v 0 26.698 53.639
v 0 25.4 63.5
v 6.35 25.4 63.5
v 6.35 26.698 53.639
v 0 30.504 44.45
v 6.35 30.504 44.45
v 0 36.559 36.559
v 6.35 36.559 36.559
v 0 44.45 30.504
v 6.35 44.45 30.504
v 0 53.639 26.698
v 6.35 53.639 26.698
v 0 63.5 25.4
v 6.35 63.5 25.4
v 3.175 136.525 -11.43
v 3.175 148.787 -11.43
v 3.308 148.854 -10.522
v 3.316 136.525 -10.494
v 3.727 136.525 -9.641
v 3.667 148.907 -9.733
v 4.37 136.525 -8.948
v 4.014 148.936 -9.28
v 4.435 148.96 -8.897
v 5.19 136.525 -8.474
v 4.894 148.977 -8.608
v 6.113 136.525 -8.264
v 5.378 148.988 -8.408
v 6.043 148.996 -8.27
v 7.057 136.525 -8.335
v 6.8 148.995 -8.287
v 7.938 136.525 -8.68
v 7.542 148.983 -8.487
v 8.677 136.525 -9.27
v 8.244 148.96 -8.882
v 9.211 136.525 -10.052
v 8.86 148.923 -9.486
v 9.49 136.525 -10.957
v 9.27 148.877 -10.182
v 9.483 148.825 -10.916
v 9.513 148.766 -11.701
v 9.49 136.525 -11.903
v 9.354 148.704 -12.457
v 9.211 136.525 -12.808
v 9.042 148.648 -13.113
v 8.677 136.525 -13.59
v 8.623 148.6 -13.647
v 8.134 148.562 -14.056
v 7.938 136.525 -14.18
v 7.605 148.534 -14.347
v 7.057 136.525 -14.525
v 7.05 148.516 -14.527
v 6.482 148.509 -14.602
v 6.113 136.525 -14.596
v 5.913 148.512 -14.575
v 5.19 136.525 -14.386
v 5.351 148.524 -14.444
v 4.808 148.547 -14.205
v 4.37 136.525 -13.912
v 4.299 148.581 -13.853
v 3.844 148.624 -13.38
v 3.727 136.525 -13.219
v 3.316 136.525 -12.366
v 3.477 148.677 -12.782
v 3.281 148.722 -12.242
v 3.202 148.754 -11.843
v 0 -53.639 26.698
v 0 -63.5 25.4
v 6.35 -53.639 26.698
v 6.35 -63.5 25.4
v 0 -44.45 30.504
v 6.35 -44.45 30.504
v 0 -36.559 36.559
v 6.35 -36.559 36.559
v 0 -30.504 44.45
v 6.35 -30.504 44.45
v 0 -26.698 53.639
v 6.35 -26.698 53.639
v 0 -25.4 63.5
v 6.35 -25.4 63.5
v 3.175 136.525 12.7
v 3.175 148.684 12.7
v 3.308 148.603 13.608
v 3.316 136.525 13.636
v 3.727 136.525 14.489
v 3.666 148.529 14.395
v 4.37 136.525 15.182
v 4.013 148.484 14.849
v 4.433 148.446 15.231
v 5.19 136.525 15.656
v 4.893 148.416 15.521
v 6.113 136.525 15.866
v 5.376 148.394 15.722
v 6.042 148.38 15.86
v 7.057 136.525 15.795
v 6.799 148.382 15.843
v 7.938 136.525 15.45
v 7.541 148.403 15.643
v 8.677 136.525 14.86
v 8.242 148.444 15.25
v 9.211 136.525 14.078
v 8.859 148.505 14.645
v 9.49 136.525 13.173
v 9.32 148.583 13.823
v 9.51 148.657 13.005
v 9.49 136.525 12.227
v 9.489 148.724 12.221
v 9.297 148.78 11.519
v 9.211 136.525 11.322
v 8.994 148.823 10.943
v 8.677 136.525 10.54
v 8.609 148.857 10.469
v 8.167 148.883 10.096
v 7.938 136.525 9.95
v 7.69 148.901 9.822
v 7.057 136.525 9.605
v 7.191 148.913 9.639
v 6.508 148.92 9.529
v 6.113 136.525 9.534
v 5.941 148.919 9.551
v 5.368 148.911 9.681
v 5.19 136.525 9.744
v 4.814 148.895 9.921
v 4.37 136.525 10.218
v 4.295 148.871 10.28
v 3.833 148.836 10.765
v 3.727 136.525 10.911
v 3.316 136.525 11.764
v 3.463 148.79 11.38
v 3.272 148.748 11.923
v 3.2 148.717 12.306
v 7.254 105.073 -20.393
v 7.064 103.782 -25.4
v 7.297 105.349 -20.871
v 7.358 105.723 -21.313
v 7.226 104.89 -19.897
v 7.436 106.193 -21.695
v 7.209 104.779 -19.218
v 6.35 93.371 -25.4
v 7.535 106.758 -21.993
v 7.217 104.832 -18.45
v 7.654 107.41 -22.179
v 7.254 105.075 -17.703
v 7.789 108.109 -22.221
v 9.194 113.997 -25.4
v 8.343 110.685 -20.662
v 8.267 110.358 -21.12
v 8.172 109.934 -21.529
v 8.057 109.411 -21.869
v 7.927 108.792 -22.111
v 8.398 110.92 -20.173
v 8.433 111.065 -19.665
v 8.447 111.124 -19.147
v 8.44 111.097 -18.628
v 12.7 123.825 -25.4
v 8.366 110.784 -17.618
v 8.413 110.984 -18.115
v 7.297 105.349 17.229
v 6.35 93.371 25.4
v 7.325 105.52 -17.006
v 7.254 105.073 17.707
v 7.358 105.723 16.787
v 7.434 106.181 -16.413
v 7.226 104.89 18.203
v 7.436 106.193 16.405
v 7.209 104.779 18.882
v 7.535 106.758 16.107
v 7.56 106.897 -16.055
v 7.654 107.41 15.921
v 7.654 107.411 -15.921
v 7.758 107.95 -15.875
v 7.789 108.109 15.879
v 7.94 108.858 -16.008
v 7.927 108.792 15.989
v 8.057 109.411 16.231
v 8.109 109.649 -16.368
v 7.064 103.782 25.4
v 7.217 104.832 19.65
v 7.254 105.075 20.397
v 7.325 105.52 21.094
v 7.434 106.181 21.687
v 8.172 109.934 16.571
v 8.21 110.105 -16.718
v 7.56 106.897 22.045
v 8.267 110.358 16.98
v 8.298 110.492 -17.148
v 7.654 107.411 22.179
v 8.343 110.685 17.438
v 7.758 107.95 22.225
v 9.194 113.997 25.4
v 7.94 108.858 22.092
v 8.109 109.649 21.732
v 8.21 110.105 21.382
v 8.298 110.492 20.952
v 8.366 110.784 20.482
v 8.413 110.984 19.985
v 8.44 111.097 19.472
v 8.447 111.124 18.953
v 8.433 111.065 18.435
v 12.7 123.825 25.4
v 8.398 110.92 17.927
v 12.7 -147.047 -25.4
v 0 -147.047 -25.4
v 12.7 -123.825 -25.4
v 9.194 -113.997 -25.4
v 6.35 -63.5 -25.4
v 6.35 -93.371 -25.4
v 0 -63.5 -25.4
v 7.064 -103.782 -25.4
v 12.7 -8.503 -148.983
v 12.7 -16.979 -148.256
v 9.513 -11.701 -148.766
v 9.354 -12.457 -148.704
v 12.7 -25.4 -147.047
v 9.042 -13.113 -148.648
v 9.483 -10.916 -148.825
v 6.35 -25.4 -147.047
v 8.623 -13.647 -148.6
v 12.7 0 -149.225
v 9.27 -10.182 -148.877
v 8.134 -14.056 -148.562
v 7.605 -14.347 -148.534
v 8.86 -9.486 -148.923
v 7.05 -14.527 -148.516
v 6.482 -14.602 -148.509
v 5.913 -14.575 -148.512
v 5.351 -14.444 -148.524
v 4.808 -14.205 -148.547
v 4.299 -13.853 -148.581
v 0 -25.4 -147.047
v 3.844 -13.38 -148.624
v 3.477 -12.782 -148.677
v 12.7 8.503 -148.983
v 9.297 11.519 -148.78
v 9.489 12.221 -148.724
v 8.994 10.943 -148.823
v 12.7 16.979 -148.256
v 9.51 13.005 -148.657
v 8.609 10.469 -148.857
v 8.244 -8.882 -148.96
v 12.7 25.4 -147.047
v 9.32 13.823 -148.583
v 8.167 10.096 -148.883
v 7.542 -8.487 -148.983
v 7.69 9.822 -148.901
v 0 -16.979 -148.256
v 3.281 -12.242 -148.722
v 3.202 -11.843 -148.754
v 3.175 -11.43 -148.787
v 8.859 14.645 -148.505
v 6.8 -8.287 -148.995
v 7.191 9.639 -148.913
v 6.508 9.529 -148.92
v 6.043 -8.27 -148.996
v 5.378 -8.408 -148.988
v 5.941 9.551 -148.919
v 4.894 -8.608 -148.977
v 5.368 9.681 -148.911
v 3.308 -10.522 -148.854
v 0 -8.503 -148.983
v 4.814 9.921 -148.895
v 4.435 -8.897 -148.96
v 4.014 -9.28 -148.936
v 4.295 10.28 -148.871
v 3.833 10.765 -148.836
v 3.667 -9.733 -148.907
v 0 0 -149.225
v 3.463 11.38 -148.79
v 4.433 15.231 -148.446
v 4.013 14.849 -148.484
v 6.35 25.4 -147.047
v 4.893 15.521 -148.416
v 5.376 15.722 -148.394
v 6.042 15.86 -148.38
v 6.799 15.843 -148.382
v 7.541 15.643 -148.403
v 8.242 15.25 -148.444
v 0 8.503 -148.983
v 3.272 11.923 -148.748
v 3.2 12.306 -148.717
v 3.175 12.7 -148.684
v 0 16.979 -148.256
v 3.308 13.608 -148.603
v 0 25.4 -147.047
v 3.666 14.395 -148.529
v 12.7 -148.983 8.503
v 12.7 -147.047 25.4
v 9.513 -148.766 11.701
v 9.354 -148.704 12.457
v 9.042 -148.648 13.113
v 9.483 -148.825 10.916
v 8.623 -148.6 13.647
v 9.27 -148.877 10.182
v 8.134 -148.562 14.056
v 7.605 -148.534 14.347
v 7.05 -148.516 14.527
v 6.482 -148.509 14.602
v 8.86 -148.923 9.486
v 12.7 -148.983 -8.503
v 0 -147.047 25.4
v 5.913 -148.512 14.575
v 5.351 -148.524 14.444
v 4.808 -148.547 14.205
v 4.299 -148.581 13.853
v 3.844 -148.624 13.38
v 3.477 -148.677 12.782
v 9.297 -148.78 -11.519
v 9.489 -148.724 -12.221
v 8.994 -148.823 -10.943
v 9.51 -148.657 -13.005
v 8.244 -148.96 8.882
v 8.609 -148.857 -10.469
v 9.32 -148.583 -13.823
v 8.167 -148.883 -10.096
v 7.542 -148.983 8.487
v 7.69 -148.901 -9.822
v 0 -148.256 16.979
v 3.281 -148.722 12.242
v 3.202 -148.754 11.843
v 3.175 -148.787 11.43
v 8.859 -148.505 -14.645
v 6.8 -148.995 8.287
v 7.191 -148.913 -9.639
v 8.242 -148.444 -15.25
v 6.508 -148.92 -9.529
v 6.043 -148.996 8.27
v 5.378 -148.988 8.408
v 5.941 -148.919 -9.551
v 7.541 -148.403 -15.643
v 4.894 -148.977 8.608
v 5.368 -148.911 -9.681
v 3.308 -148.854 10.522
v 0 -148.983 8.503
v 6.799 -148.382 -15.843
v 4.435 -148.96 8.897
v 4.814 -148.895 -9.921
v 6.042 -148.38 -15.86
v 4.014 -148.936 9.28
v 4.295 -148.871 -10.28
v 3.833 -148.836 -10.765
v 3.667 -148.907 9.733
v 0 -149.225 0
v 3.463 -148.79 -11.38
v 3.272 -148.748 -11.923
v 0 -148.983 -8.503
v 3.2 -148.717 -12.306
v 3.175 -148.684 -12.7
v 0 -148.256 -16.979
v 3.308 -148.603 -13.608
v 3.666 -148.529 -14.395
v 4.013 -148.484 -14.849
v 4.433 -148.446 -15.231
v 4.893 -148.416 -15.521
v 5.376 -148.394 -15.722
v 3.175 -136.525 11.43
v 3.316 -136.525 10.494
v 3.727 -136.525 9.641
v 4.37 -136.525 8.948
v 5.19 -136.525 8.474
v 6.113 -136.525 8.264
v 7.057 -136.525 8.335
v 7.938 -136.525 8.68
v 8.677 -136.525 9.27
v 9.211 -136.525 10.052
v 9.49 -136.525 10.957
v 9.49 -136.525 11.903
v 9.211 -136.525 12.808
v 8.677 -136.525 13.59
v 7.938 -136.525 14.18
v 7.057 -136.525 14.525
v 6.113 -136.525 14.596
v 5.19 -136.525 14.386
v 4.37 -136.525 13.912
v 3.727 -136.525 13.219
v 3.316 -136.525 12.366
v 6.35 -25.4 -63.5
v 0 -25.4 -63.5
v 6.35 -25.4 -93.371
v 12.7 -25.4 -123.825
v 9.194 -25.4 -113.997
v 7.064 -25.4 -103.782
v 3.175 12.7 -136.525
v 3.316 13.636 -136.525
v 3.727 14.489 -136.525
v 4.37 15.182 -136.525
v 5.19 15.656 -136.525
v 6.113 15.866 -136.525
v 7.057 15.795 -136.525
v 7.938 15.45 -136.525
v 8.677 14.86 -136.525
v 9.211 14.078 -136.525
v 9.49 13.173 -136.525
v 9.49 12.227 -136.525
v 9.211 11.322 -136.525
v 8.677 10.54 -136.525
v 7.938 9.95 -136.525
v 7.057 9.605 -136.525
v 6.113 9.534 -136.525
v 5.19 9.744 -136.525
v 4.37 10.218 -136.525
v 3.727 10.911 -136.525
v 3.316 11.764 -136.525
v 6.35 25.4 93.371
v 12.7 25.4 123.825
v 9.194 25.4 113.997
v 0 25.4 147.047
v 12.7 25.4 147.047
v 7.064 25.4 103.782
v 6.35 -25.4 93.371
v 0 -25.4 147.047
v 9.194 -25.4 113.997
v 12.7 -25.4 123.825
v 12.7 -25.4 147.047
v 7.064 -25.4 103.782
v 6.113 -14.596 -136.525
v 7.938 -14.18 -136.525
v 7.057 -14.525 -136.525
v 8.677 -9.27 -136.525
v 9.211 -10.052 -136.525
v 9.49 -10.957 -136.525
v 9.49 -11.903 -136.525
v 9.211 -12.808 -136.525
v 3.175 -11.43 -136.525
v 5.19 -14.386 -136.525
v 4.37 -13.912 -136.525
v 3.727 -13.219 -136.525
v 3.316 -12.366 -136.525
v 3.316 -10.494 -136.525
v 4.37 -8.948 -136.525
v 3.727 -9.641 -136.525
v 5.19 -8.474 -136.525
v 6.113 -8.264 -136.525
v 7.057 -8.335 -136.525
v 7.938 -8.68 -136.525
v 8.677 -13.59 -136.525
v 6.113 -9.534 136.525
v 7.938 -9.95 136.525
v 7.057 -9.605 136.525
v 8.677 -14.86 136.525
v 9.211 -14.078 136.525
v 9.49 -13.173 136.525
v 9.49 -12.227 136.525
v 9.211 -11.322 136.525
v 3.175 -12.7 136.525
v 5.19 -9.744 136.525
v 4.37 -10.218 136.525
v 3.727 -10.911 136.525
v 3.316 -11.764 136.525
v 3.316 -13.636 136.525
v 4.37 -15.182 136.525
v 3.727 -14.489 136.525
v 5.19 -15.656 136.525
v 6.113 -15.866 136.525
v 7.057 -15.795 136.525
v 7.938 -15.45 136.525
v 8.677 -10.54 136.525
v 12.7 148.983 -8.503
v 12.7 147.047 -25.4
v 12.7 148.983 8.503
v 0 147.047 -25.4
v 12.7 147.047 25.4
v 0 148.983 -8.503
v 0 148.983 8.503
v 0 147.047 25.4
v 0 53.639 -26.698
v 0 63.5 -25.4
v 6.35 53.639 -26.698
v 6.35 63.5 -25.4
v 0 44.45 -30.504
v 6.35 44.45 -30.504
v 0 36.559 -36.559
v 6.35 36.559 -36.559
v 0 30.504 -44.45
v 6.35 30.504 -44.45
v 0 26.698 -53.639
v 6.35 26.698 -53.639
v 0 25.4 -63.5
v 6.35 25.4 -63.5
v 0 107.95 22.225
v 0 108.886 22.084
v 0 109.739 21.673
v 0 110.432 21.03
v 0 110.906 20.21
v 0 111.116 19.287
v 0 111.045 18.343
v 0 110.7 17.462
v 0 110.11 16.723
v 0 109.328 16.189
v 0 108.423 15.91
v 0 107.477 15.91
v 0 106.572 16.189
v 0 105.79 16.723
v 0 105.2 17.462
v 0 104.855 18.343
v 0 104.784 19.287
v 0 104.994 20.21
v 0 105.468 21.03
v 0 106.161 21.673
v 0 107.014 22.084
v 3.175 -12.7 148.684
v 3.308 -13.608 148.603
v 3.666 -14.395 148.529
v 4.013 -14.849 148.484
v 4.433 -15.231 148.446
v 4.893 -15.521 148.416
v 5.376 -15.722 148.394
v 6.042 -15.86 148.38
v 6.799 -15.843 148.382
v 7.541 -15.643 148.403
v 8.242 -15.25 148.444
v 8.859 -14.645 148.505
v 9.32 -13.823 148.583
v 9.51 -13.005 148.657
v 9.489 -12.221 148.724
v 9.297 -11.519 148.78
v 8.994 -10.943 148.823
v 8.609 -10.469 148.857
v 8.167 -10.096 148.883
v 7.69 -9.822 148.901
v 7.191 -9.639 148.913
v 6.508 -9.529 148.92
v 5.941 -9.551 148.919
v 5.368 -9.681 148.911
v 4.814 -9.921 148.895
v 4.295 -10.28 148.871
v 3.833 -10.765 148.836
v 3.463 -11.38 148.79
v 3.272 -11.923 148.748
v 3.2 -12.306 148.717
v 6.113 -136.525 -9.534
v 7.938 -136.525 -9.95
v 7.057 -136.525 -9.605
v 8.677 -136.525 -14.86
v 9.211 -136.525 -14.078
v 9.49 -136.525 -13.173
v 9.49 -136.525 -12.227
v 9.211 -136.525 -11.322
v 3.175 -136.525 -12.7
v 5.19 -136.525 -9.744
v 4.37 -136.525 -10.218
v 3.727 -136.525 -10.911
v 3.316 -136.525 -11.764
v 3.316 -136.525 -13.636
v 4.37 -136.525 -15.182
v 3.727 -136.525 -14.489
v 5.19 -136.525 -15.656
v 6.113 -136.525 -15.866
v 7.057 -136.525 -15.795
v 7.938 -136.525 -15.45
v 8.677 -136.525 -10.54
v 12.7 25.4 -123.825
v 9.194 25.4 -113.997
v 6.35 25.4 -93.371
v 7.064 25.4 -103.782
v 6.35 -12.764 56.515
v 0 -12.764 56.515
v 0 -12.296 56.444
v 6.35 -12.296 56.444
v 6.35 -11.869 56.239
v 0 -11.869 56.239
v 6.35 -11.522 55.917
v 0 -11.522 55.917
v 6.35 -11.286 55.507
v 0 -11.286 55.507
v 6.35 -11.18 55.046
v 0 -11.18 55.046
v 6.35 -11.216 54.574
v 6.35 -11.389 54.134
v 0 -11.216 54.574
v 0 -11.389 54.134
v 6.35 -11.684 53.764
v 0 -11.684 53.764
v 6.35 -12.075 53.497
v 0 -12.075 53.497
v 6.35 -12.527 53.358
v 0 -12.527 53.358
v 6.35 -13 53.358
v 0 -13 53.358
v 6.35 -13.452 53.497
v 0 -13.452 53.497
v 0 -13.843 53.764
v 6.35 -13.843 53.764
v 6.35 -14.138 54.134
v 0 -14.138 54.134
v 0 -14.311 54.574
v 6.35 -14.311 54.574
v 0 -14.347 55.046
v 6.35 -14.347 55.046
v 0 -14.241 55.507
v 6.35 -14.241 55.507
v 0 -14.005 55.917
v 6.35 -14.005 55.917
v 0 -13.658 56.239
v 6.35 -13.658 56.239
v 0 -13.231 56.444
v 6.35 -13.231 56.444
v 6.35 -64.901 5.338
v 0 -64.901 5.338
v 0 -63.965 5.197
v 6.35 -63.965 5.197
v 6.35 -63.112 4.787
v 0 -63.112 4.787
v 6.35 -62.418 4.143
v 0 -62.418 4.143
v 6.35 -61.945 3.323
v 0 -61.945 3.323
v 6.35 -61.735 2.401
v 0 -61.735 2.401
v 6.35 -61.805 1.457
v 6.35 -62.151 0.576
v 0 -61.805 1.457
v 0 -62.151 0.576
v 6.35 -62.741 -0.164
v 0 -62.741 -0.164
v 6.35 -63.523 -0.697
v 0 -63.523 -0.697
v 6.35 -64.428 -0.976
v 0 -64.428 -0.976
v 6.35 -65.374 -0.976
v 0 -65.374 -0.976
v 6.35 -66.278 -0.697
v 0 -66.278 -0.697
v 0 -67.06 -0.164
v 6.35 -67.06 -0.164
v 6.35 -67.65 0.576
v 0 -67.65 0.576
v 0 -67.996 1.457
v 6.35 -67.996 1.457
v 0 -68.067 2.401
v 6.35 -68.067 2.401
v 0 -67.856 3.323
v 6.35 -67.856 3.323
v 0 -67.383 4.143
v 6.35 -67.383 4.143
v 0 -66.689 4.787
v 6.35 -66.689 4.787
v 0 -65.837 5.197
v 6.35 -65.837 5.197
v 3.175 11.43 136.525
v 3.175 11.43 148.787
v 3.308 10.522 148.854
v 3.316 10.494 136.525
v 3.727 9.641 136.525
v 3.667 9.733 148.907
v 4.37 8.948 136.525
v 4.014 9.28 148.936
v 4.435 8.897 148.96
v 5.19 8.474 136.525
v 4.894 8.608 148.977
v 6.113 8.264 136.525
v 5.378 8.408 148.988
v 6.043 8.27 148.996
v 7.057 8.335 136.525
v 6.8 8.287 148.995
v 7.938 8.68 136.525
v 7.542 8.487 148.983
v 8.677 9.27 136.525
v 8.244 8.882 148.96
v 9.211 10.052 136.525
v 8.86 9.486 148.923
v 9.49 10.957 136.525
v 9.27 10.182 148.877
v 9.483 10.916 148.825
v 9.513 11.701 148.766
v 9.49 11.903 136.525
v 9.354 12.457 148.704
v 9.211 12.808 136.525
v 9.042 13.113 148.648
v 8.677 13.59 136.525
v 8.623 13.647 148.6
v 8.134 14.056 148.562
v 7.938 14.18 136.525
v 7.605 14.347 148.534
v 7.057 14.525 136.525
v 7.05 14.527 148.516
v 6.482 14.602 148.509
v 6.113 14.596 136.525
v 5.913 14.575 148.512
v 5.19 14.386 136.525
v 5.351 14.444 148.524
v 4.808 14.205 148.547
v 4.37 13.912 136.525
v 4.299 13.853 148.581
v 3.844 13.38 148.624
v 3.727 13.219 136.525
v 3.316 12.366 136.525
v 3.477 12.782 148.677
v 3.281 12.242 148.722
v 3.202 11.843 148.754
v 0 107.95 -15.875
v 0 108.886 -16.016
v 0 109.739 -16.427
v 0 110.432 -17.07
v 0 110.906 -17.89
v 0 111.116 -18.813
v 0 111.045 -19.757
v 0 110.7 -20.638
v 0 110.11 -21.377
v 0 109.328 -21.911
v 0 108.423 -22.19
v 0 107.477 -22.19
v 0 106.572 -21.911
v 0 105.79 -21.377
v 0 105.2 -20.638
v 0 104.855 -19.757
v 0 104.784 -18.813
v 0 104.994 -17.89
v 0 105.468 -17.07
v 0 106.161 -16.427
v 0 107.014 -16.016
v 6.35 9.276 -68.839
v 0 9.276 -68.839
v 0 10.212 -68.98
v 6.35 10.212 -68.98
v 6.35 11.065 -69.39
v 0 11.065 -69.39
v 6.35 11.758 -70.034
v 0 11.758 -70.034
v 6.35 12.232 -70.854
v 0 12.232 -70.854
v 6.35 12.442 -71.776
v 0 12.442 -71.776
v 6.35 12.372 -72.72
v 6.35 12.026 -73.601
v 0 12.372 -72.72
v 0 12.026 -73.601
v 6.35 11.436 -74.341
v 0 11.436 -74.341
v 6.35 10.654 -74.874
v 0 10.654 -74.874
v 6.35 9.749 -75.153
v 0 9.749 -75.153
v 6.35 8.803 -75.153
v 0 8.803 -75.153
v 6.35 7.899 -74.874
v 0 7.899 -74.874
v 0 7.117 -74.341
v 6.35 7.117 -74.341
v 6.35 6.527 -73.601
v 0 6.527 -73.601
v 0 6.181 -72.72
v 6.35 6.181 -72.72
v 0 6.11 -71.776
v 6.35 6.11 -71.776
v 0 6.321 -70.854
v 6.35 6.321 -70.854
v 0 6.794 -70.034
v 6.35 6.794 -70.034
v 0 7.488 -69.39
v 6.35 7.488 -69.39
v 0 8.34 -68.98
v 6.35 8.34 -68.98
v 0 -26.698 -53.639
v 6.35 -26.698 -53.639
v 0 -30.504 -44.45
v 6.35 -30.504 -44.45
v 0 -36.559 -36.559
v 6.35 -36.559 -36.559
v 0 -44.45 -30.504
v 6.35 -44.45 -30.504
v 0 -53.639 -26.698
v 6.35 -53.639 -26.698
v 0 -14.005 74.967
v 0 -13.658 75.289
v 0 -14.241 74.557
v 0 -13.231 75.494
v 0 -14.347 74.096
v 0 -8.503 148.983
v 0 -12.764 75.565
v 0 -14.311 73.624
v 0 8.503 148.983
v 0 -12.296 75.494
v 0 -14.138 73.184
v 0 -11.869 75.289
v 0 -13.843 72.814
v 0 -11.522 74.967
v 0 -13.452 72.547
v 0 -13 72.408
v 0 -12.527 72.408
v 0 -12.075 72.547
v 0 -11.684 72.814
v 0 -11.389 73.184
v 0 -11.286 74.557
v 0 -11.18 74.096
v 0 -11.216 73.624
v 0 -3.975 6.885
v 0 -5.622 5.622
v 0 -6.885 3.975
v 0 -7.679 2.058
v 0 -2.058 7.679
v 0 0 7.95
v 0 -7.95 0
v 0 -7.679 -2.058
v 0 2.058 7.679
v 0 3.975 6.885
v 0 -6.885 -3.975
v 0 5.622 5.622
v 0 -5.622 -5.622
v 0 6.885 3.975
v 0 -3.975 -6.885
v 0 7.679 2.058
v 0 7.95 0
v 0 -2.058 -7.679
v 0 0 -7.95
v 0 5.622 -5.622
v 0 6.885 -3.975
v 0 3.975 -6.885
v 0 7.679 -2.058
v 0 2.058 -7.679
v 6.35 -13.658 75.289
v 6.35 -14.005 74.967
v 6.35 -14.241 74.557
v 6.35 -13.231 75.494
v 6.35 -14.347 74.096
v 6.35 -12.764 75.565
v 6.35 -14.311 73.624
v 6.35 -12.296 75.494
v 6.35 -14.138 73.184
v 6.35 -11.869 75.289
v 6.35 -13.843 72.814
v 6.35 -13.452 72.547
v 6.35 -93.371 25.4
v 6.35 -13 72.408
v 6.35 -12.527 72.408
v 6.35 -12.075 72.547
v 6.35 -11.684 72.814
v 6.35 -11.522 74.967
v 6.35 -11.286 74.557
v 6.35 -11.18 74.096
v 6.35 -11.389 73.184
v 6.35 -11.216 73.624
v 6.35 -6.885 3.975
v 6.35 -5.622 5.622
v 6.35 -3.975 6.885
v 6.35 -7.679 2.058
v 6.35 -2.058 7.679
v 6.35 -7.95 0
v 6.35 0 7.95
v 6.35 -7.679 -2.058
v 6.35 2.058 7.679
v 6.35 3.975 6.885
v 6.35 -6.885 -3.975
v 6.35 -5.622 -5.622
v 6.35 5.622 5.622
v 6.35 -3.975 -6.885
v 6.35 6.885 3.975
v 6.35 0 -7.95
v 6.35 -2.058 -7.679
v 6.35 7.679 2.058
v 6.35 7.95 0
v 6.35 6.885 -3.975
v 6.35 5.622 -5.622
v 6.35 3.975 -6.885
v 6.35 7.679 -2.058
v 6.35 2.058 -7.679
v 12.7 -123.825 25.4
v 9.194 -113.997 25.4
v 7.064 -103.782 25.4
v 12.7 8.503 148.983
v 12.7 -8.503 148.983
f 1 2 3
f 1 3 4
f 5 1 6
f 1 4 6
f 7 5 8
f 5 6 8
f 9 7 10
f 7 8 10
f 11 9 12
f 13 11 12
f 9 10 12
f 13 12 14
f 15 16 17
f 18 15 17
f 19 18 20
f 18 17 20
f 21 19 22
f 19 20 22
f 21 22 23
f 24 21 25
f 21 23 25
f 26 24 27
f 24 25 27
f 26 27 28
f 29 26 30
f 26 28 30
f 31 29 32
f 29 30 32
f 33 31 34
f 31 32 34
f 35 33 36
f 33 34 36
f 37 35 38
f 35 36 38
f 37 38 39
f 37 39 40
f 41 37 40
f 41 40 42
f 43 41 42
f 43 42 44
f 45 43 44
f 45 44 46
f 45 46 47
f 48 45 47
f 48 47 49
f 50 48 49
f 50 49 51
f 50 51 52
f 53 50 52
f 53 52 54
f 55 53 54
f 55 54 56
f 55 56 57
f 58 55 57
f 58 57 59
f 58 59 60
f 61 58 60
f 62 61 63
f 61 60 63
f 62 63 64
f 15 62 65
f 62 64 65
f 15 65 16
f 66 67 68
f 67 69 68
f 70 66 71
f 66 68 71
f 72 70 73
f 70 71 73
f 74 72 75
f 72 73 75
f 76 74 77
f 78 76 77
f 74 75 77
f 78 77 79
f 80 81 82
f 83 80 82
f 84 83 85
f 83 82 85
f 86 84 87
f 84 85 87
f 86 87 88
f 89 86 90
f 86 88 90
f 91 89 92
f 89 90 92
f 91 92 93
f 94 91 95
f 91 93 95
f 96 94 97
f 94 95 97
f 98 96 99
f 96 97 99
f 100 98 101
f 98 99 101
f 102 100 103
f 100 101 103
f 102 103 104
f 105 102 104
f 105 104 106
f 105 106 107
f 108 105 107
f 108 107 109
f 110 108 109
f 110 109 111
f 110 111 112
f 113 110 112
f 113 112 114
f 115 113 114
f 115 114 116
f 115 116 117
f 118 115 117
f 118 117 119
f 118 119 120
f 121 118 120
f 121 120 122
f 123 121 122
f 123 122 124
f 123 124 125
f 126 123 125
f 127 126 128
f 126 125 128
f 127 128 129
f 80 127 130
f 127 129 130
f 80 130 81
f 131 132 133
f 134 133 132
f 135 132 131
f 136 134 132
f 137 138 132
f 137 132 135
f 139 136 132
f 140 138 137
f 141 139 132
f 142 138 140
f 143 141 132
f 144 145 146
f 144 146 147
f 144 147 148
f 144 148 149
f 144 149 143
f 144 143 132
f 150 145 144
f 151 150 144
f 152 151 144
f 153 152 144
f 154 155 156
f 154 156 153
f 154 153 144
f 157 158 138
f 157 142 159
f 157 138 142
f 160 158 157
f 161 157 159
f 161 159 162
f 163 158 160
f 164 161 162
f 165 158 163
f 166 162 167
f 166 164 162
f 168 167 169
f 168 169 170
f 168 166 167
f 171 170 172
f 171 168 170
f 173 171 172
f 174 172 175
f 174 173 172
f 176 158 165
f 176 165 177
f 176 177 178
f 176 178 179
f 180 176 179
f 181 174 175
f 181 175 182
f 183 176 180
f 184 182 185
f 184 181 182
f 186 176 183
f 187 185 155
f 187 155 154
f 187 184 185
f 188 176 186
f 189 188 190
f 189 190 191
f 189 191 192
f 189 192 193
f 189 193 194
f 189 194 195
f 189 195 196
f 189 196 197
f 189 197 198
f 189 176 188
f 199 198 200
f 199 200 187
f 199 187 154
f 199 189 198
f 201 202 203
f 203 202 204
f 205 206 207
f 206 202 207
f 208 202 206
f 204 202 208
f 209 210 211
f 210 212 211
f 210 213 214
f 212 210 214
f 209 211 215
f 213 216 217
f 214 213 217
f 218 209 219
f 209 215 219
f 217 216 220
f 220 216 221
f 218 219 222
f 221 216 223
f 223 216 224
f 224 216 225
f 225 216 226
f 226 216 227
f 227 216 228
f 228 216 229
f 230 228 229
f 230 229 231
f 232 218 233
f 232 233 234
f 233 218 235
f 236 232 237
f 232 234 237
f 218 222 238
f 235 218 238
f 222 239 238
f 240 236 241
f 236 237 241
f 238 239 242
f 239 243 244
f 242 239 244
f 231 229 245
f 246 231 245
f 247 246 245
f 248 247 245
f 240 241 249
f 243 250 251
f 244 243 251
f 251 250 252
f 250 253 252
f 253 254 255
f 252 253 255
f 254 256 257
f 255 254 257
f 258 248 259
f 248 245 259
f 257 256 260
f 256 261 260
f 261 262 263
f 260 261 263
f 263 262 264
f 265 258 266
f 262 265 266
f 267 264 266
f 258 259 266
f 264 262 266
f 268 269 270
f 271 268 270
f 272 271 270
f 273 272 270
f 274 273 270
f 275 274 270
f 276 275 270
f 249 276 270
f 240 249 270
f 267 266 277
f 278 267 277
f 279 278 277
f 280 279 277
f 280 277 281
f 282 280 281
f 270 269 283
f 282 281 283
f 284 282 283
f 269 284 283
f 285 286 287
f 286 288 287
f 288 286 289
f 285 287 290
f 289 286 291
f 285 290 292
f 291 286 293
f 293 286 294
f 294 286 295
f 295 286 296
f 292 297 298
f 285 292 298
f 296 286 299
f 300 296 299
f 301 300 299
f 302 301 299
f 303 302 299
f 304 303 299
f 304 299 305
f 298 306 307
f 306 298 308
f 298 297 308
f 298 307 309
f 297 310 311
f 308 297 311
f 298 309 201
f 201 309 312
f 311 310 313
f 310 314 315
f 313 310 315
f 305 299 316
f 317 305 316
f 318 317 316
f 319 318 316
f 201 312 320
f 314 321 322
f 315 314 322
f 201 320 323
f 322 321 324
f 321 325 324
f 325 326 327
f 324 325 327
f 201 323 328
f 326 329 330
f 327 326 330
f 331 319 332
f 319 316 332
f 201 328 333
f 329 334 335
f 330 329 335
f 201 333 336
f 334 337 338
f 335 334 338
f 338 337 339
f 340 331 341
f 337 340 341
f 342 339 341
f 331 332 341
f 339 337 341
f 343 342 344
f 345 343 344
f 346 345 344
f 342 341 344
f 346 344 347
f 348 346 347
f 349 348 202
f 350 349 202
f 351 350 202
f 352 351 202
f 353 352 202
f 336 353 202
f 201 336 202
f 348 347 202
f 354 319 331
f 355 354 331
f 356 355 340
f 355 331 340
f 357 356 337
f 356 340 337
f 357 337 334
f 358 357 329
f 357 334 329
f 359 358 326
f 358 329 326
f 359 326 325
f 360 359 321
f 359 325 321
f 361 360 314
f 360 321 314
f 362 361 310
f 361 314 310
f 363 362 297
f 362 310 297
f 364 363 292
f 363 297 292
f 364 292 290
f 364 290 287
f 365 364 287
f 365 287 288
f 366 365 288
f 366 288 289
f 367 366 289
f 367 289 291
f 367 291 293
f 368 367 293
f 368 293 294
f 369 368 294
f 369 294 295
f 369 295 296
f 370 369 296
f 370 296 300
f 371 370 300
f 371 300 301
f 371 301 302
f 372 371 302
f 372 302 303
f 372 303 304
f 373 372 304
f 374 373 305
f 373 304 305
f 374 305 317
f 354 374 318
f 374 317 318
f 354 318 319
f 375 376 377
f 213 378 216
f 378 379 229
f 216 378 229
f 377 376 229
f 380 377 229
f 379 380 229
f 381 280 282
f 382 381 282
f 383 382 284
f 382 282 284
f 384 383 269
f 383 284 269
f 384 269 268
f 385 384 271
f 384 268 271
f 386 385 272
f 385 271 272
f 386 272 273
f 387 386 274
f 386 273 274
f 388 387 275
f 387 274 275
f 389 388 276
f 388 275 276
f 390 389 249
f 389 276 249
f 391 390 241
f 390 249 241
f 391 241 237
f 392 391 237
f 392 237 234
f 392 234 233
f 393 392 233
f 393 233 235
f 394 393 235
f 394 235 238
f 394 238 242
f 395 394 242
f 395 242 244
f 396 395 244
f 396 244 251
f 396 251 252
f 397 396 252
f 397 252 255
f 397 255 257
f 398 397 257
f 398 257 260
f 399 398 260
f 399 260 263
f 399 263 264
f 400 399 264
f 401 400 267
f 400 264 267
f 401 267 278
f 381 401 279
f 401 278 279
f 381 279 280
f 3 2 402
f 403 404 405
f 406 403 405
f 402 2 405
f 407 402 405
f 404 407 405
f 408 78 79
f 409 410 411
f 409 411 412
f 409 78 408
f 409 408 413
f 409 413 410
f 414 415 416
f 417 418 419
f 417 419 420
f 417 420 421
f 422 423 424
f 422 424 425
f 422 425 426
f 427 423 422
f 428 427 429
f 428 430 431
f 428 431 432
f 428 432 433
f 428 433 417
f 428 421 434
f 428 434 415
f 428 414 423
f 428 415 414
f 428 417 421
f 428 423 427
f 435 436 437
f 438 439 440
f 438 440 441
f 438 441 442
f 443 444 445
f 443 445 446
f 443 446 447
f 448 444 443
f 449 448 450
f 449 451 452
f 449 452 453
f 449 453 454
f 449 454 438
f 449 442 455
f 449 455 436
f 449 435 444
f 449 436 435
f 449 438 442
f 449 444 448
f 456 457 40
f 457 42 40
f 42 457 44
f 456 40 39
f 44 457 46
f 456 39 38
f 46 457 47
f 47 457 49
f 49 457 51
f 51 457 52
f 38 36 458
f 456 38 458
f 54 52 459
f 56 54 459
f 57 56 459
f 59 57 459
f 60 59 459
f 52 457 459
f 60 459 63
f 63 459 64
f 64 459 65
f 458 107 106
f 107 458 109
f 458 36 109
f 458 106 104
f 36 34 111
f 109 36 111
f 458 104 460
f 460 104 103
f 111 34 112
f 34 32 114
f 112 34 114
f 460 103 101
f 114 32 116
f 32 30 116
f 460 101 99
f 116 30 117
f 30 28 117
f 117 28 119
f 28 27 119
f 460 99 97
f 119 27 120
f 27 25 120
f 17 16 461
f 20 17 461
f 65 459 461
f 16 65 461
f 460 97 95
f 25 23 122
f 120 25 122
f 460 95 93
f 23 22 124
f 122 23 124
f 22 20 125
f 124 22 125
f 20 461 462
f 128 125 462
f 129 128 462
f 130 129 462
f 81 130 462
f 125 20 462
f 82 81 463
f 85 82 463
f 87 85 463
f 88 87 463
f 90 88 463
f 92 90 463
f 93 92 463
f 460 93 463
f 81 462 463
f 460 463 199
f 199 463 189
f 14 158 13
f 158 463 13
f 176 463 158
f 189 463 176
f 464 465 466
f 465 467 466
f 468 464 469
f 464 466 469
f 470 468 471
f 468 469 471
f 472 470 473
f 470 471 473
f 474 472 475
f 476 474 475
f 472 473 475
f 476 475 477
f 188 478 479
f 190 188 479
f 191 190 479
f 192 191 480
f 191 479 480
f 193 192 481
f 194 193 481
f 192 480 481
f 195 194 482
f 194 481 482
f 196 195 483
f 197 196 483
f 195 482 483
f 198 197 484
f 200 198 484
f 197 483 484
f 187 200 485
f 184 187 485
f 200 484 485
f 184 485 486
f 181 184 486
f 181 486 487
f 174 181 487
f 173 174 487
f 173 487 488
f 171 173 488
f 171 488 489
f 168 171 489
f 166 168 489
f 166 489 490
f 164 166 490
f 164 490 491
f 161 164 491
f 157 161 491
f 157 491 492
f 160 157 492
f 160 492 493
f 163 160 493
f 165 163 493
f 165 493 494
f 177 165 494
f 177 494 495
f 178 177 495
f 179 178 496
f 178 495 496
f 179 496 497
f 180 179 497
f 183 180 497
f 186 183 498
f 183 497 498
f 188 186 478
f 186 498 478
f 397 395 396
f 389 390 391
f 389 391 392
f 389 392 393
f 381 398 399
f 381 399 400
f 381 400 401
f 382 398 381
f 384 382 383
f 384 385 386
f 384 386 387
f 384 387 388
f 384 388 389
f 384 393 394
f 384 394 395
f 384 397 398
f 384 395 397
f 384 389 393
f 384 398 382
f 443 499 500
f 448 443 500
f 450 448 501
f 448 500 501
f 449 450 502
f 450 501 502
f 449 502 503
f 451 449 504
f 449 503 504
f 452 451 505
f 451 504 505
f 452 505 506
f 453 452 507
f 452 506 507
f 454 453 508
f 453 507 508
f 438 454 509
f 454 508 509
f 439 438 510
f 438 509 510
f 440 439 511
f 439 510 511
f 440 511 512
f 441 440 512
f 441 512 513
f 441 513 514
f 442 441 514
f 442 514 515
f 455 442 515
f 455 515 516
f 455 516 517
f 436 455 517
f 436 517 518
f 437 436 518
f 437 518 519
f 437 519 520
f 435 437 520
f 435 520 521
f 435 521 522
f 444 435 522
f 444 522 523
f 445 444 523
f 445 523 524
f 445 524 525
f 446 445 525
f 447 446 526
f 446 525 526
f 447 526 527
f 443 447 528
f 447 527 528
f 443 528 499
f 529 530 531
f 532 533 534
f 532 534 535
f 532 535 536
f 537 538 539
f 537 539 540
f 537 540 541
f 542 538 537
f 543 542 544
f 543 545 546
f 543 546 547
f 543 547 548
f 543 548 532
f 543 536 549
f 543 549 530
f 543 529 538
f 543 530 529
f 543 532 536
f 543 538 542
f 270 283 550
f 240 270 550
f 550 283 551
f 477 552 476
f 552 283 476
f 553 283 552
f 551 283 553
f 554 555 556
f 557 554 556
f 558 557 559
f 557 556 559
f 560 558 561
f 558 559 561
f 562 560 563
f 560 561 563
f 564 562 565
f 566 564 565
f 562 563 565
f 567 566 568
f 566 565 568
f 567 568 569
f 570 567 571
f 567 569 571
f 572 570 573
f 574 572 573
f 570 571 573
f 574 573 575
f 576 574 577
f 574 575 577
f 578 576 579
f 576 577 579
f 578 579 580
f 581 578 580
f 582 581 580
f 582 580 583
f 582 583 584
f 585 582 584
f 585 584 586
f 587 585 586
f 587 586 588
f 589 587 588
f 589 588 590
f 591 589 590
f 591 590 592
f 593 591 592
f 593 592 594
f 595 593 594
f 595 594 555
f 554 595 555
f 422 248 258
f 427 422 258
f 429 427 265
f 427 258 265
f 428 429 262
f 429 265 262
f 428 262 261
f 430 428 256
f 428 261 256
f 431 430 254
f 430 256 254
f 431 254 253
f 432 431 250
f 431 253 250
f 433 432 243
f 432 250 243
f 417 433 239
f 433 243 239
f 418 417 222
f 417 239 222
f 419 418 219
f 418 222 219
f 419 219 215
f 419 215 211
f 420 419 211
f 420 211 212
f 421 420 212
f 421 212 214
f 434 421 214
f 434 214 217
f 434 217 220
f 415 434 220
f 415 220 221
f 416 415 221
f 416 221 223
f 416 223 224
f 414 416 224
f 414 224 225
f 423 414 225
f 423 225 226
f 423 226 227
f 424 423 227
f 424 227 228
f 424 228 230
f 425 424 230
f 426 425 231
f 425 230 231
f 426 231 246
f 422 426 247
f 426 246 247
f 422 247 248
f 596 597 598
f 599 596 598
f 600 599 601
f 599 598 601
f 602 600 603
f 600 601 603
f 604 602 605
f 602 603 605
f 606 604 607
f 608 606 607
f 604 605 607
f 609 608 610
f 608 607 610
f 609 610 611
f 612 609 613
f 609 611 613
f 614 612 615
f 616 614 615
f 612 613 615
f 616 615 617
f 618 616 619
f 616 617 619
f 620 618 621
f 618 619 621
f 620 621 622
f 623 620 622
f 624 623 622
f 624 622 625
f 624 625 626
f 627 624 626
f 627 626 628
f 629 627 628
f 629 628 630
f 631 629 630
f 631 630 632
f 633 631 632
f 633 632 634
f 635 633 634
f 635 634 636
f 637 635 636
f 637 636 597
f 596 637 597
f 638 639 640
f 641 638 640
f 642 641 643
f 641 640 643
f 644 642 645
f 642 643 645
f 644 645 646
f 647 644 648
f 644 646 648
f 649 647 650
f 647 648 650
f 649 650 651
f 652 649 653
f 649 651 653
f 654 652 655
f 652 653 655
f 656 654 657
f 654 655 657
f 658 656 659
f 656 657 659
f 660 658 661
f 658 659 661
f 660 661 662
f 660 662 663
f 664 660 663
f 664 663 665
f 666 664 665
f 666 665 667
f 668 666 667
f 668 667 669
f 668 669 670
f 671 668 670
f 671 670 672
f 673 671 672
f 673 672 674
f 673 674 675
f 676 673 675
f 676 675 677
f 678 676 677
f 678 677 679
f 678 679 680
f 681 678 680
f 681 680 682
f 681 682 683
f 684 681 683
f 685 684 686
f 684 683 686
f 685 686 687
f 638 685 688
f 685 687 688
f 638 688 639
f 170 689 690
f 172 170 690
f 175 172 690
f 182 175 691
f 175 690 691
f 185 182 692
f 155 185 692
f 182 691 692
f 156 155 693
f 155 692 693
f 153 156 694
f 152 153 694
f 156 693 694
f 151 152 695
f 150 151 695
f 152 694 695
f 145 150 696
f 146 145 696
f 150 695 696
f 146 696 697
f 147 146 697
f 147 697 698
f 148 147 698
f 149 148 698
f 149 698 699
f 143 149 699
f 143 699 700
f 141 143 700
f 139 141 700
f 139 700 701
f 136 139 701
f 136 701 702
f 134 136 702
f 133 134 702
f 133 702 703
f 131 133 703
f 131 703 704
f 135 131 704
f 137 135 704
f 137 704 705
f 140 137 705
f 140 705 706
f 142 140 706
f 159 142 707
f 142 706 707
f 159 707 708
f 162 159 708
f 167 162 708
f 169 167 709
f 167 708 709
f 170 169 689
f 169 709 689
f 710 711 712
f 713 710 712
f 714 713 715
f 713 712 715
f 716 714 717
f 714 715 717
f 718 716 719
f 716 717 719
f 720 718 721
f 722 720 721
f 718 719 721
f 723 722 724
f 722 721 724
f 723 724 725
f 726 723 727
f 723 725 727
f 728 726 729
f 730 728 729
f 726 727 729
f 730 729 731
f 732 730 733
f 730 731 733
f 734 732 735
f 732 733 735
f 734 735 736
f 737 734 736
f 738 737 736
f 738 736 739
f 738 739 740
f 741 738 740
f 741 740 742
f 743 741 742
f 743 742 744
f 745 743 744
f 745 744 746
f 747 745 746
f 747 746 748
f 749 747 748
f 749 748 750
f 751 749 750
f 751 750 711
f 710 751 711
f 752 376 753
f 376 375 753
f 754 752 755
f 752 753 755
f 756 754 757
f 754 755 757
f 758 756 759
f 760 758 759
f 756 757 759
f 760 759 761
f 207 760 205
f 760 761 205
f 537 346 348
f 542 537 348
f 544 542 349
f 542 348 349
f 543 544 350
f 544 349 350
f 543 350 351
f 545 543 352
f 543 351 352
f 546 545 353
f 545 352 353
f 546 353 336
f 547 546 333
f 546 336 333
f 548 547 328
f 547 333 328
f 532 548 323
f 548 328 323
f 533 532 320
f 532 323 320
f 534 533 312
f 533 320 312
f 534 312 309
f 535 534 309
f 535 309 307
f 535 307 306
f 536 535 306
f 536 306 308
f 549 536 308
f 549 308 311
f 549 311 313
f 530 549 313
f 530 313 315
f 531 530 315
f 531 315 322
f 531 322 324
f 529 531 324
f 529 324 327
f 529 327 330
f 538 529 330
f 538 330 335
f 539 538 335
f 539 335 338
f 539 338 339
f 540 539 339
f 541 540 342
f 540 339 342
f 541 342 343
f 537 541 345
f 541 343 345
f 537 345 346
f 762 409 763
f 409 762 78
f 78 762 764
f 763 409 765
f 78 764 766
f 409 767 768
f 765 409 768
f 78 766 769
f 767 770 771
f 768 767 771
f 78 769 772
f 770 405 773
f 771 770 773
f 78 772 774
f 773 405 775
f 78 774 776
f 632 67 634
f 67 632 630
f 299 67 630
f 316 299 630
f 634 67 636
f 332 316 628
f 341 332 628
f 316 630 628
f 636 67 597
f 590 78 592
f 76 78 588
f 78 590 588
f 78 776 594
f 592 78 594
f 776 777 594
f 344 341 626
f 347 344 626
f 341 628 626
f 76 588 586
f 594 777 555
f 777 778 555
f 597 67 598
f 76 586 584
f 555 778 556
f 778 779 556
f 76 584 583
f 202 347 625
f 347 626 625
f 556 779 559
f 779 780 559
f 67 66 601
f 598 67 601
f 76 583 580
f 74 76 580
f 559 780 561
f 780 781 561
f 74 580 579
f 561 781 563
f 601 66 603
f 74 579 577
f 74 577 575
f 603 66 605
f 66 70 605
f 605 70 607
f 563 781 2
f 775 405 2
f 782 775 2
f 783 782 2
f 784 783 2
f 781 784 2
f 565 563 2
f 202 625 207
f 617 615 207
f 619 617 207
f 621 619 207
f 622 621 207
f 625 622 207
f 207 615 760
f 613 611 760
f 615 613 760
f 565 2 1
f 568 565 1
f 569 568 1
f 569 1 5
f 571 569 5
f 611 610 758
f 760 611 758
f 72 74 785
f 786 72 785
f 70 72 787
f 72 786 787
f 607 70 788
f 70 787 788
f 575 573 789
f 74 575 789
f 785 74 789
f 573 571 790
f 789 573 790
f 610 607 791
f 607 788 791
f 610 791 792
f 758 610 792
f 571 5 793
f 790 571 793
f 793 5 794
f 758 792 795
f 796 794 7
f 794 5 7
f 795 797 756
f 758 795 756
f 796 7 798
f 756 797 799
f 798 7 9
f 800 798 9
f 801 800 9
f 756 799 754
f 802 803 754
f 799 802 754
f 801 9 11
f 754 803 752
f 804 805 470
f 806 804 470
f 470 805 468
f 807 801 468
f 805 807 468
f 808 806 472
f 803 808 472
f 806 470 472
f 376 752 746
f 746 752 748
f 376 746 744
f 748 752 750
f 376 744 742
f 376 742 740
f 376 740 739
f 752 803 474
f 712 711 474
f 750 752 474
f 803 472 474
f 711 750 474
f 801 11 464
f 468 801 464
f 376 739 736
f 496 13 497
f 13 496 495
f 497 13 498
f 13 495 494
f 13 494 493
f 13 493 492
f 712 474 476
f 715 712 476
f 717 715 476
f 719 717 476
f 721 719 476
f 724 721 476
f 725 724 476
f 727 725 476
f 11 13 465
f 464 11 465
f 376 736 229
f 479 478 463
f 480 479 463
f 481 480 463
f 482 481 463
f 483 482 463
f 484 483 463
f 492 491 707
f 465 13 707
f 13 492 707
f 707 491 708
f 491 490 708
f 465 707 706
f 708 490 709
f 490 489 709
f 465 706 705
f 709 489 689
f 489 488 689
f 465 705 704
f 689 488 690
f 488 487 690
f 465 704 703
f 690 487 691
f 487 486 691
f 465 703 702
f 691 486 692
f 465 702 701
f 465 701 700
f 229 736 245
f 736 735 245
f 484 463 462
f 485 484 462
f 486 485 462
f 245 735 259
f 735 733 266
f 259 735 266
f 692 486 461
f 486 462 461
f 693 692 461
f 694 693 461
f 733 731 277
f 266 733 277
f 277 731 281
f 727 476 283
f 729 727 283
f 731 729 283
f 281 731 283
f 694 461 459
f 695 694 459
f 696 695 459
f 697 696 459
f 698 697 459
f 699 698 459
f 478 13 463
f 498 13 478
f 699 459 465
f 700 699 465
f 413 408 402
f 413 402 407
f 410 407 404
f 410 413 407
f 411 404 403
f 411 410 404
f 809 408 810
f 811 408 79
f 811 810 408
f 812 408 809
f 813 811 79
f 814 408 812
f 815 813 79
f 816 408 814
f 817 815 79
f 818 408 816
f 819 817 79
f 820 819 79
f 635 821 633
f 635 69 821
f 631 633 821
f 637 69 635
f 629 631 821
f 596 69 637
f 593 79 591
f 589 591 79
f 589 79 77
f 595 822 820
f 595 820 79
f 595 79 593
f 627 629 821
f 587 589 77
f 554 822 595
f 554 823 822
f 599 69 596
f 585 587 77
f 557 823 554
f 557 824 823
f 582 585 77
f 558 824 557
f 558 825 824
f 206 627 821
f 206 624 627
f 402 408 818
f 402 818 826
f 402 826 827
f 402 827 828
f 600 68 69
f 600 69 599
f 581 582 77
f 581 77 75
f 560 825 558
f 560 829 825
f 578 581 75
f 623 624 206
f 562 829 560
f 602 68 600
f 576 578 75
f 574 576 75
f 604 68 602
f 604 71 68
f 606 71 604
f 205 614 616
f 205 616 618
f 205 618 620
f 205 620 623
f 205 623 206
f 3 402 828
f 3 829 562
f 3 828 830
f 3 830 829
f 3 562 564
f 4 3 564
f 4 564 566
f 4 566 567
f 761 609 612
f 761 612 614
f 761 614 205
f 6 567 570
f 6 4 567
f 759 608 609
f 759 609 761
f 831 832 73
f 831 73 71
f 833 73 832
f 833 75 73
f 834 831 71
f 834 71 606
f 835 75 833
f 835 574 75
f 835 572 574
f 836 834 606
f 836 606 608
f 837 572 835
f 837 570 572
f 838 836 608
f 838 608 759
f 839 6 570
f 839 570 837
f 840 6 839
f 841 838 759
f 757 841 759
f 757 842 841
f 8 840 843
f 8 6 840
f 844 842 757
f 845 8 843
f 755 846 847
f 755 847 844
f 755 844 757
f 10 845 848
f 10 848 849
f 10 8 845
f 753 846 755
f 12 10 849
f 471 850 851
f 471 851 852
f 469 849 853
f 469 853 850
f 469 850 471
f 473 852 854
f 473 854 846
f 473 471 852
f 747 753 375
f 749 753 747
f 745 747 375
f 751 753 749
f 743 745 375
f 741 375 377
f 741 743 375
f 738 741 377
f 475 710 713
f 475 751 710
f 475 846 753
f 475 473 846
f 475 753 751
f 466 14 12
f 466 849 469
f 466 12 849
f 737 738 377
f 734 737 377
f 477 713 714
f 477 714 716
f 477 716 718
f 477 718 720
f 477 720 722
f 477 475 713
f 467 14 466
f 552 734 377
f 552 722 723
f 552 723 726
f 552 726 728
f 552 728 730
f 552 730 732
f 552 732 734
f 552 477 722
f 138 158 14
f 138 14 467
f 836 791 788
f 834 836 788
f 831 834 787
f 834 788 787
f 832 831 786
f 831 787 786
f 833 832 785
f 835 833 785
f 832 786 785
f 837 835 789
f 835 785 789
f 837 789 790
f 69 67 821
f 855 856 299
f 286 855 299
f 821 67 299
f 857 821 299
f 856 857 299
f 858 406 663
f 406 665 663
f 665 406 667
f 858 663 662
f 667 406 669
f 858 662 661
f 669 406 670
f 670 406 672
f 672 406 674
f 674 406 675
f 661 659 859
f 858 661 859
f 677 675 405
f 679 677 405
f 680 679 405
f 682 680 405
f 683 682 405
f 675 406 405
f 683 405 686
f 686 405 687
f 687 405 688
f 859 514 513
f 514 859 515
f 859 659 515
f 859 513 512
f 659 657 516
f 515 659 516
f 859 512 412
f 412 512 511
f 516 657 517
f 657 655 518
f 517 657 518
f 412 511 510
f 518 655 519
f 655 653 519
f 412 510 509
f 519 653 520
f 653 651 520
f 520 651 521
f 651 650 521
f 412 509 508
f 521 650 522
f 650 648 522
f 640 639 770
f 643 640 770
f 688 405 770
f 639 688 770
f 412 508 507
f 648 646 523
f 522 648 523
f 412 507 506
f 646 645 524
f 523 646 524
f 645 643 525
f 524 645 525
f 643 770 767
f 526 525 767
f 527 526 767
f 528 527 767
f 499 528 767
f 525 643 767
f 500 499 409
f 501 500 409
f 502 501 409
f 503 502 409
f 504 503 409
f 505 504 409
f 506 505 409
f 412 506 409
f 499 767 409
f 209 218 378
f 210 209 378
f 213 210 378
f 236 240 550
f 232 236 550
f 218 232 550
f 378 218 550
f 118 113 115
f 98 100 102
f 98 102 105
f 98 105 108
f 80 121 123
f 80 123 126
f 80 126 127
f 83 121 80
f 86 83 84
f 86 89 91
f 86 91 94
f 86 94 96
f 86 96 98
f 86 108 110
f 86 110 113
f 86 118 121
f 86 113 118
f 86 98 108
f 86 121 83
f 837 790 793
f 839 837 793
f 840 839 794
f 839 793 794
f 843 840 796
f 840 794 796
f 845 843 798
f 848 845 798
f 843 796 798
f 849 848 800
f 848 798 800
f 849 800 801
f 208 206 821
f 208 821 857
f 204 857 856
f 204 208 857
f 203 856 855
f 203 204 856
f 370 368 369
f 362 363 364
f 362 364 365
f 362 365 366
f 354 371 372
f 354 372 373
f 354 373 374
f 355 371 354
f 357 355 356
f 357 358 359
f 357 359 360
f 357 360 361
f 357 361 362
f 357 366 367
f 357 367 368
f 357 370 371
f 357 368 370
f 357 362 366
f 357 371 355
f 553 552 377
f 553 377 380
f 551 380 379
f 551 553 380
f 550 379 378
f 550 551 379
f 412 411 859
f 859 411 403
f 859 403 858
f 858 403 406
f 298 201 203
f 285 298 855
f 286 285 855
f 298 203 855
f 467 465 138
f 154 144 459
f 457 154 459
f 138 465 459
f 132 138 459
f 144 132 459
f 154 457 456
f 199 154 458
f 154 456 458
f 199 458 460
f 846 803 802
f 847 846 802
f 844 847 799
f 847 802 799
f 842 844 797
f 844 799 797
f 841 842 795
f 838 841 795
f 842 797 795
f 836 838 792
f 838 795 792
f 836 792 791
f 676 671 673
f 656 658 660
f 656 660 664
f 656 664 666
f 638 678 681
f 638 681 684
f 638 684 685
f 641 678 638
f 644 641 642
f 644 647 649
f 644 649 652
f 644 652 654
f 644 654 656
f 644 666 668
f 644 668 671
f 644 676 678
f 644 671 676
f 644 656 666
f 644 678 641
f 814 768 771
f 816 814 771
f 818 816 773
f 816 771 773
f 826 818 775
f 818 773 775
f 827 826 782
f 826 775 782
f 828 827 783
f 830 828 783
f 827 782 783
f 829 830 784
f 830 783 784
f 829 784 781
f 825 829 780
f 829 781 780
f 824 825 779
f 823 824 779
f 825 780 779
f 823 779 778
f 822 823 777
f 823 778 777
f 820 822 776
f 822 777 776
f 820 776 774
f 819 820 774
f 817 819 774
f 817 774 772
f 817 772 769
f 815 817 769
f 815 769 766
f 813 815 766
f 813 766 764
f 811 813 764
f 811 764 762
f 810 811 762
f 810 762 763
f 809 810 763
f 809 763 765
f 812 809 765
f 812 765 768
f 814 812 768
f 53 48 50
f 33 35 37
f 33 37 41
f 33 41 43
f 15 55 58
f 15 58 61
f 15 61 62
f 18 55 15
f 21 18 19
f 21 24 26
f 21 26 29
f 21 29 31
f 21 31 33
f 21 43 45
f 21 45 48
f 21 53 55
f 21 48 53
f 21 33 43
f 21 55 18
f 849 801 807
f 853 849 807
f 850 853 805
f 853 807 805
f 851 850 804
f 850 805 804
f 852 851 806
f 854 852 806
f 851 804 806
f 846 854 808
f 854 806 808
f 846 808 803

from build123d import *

# Parameters (mm, degrees)
BOSS_EXTRUDE1_DEPTH = 6.35
SKETCH2_W           = 23.222409447
SKETCH2_H           = 25.4
BOSS_EXTRUDE2_DEPTH = 12.7
FILLET1_R           = 38.1
FILLET2_R           = 76.2
SKETCH3_R           = 3.175
CUT_EXTRUDE1_DEPTH  = 12.7
CIRPATTERN1_COUNT   = 4
SKETCH4_R           = 1.5875
SKETCH4_R_2         = 3.175
CUT_EXTRUDE2_DEPTH  = 212.417812192
SKETCH5_R           = 3.175
CUT_EXTRUDE3_DEPTH  = 212.417812192


with BuildPart() as part:
    # Sketch1 → Boss-Extrude1 (new body)
    with BuildSketch(Plane(origin=(0, 0, 0), x_dir=(0, 0, -1), z_dir=(1, 0, 0))):
        with BuildLine():
            Line((-25.4, 25.4), (0, 25.4))
            Line((0, 25.4), (25.4, 25.4))
            Line((25.4, 25.4), (25.4, 147.047409447))
            ThreePointArc((25.4, 147.047409447), (0, 149.225), (-25.4, 147.047409447))
            Line((-25.4, 147.047409447), (-25.4, 25.4))
        make_face()
        with BuildLine():
            Line((25.4, 25.4), (25.4, 0))
            Line((25.4, 0), (25.4, -25.4))
            Line((25.4, -25.4), (147.047409447, -25.4))
            ThreePointArc((147.047409447, -25.4), (148.679605696, -12.746586804), (149.225, 0))
            ThreePointArc((149.225, 0), (148.679605696, 12.746586804), (147.047409447, 25.4))
            Line((147.047409447, 25.4), (25.4, 25.4))
        make_face()
        with BuildLine():
            Line((-25.4, -25.4), (-25.4, 0))
            Line((-25.4, 0), (-25.4, 25.4))
            Line((-25.4, 25.4), (-147.047409447, 25.4))
            ThreePointArc((-147.047409447, 25.4), (-149.225, 0), (-147.047409447, -25.4))
            Line((-147.047409447, -25.4), (-25.4, -25.4))
        make_face()
        with BuildLine():
            Line((0, -149.225), (0, -25.4))
            Line((0, -25.4), (-25.4, -25.4))
            Line((-25.4, -25.4), (-25.4, -147.047409447))
            ThreePointArc((-25.4, -147.047409447), (-12.746586804, -148.679605696), (0, -149.225))
        make_face()
        with BuildLine():
            Line((25.4, -25.4), (0, -25.4))
            Line((0, -25.4), (0, -149.225))
            ThreePointArc((0, -149.225), (12.746586804, -148.679605696), (25.4, -147.047409447))
            Line((25.4, -147.047409447), (25.4, -25.4))
        make_face()
        with BuildLine():
            ThreePointArc((7.9502, 0), (5.621640332, -5.621640332), (0, -7.9502))
            Line((0, -7.9502), (0, -25.4))
            Line((0, -25.4), (25.4, -25.4))
            Line((25.4, -25.4), (25.4, 0))
            Line((25.4, 0), (7.9502, 0))
        make_face()
        with BuildLine():
            Line((0, -25.4), (0, -7.9502))
            ThreePointArc((0, -7.9502), (-5.621640332, -5.621640332), (-7.9502, 0))
            Line((-7.9502, 0), (-25.4, 0))
            Line((-25.4, 0), (-25.4, -25.4))
            Line((-25.4, -25.4), (0, -25.4))
        make_face()
        with BuildLine():
            Line((-25.4, 0), (-7.9502, 0))
            ThreePointArc((-7.9502, 0), (-5.621640332, 5.621640332), (0, 7.9502))
            Line((0, 7.9502), (0, 25.4))
            Line((0, 25.4), (-25.4, 25.4))
            Line((-25.4, 25.4), (-25.4, 0))
        make_face()
        with BuildLine():
            ThreePointArc((0, 7.9502), (5.621640332, 5.621640332), (7.9502, 0))
            Line((7.9502, 0), (25.4, 0))
            Line((25.4, 0), (25.4, 25.4))
            Line((25.4, 25.4), (0, 25.4))
            Line((0, 25.4), (0, 7.9502))
        make_face()
    extrude(amount=BOSS_EXTRUDE1_DEPTH)

    # Sketch2 → Boss-Extrude2 (add)
    with BuildSketch(Plane.ZY):
        with BuildLine():
            Line((-25.4, 147.047409447), (-25.4, 123.825))
            Line((-25.4, 123.825), (0, 123.825))
            Line((0, 123.825), (25.4, 123.825))
            Line((25.4, 123.825), (25.4, 147.047409447))
            ThreePointArc((25.4, 147.047409447), (0, 149.225), (-25.4, 147.047409447))
        make_face()
        with BuildLine():
            Line((147.047409447, 25.4), (123.825, 25.4))
            Line((123.825, 25.4), (123.825, 0))
            Line((123.825, 0), (123.825, -25.4))
            Line((123.825, -25.4), (147.047409447, -25.4))
            ThreePointArc((147.047409447, -25.4), (149.225, 0), (147.047409447, 25.4))
        make_face()
        with BuildLine():
            Line((0, -123.825), (-25.4, -123.825))
            Line((-25.4, -123.825), (-25.4, -147.047409447))
            ThreePointArc((-25.4, -147.047409447), (0, -149.225), (25.4, -147.047409447))
            Line((25.4, -147.047409447), (25.4, -123.825))
            Line((25.4, -123.825), (0, -123.825))
        make_face()
        with Locations((-135.436204723, -12.7)):
            Rectangle(SKETCH2_W, SKETCH2_H)
        with BuildLine():
            Line((-147.047409447, 0), (-147.047409447, 25.4))
            ThreePointArc((-147.047409447, 25.4), (-148.679605696, 12.746586804), (-149.225, 0))
            Line((-149.225, 0), (-147.047409447, 0))
        make_face()
        with BuildLine():
            Line((-147.047409447, -25.4), (-147.047409447, 0))
            Line((-147.047409447, 0), (-149.225, 0))
            ThreePointArc((-149.225, 0), (-148.679605696, -12.746586804), (-147.047409447, -25.4))
        make_face()
        with Locations((-135.436204723, 12.7)):
            Rectangle(SKETCH2_W, SKETCH2_H)
        with BuildLine():
            Line((-147.047409447, 0), (-147.047409447, 25.4))
            ThreePointArc((-147.047409447, 25.4), (-148.679605696, 12.746586804), (-149.225, 0))
            Line((-149.225, 0), (-147.047409447, 0))
        make_face()
        with BuildLine():
            Line((-147.047409447, -25.4), (-147.047409447, 0))
            Line((-147.047409447, 0), (-149.225, 0))
            ThreePointArc((-149.225, 0), (-148.679605696, -12.746586804), (-147.047409447, -25.4))
        make_face()
    extrude(amount=-BOSS_EXTRUDE2_DEPTH)

    # Fillet1
    fillet1_edges = [part.edges().sort_by_distance(p)[0] for p in [
        (3.175, -25.4, 25.4),
        (3.175, 25.4, 25.4),
        (3.175, 25.4, -25.4),
        (3.175, -25.4, -25.4),
    ]]
    fillet(fillet1_edges, radius=FILLET1_R)

    # Fillet2
    # the kernel refuses this fillet: 76.2 mm, written as the material it adds along each edge
    with BuildSketch(Plane(origin=(6.35, -25.4, 123.825), x_dir=(0, 0, -1), z_dir=(0, 1, 0)), Plane(origin=(6.35, -123.825, -25.4), x_dir=(0, 1, 0), z_dir=(0, 0, 1)), Plane(origin=(6.35, 25.4, -123.825), x_dir=(0, 0, 1), z_dir=(0, -1, 0)), Plane(origin=(6.35, 123.825, 25.4), x_dir=(0, -1, 0), z_dir=(0, 0, -1))) as fillet2_piece_1:
        with BuildLine():
            CenterArc((30.453530173, -76.2), FILLET2_R, 90, 23.556464309)
            Line((0, -6.35), (-0.609070603, -4.953))
            ThreePointArc((-0.609070603, -4.953), (-1.524, -3.175), (-1.524, 0))
            Line((-1.524, 0), (0, 1.524))
            Line((0, 1.524), (30.453530173, 1.524))
            Line((30.453530173, 1.524), (30.453530173, 0))
        make_face()
    extrude(amount=50.8)

    # Sketch3 → Cut-Extrude1 (cut)
    with BuildSketch(Plane(origin=(0, 0, -149.225), x_dir=(-1, 0, 0), z_dir=(0, 0, -1))):
        with Locations((-6.35, 12.7)):
            Circle(SKETCH3_R)
        with Locations((-6.35, -11.43)):
            Circle(SKETCH3_R)
    cut_extrude1 = extrude(amount=-CUT_EXTRUDE1_DEPTH, mode=Mode.SUBTRACT)

    # CirPattern1: Cut-Extrude1 ×4 about axis
    cirpattern1_axis = Axis((0, 0, 0), (1, 0, 0))
    for i in range(1, CIRPATTERN1_COUNT):
        add(cut_extrude1.rotate(cirpattern1_axis, i * 360 / CIRPATTERN1_COUNT), mode=Mode.SUBTRACT)

    # Sketch4 → Cut-Extrude2 (cut, through all)
    with BuildSketch(Plane.ZY):
        with Locations((73.9775, -12.7635)):
            Circle(SKETCH4_R)
        with Locations((54.9275, -12.7635)):
            Circle(SKETCH4_R)
        with Locations((19.05, 107.95)):
            Circle(SKETCH4_R_2)
        with Locations((-19.05, 107.95)):
            Circle(SKETCH4_R_2)
    extrude(amount=-CUT_EXTRUDE2_DEPTH, mode=Mode.SUBTRACT)

    # Sketch5 → Cut-Extrude3 (cut, through all)
    with BuildSketch(Plane.ZY):
        with Locations((2.163404924, -64.900779229)):
            Circle(SKETCH5_R)
        with Locations((-72.013510637, 9.276136331)):
            Circle(SKETCH5_R)
    extrude(amount=-CUT_EXTRUDE3_DEPTH, mode=Mode.SUBTRACT)


solid = part.part
